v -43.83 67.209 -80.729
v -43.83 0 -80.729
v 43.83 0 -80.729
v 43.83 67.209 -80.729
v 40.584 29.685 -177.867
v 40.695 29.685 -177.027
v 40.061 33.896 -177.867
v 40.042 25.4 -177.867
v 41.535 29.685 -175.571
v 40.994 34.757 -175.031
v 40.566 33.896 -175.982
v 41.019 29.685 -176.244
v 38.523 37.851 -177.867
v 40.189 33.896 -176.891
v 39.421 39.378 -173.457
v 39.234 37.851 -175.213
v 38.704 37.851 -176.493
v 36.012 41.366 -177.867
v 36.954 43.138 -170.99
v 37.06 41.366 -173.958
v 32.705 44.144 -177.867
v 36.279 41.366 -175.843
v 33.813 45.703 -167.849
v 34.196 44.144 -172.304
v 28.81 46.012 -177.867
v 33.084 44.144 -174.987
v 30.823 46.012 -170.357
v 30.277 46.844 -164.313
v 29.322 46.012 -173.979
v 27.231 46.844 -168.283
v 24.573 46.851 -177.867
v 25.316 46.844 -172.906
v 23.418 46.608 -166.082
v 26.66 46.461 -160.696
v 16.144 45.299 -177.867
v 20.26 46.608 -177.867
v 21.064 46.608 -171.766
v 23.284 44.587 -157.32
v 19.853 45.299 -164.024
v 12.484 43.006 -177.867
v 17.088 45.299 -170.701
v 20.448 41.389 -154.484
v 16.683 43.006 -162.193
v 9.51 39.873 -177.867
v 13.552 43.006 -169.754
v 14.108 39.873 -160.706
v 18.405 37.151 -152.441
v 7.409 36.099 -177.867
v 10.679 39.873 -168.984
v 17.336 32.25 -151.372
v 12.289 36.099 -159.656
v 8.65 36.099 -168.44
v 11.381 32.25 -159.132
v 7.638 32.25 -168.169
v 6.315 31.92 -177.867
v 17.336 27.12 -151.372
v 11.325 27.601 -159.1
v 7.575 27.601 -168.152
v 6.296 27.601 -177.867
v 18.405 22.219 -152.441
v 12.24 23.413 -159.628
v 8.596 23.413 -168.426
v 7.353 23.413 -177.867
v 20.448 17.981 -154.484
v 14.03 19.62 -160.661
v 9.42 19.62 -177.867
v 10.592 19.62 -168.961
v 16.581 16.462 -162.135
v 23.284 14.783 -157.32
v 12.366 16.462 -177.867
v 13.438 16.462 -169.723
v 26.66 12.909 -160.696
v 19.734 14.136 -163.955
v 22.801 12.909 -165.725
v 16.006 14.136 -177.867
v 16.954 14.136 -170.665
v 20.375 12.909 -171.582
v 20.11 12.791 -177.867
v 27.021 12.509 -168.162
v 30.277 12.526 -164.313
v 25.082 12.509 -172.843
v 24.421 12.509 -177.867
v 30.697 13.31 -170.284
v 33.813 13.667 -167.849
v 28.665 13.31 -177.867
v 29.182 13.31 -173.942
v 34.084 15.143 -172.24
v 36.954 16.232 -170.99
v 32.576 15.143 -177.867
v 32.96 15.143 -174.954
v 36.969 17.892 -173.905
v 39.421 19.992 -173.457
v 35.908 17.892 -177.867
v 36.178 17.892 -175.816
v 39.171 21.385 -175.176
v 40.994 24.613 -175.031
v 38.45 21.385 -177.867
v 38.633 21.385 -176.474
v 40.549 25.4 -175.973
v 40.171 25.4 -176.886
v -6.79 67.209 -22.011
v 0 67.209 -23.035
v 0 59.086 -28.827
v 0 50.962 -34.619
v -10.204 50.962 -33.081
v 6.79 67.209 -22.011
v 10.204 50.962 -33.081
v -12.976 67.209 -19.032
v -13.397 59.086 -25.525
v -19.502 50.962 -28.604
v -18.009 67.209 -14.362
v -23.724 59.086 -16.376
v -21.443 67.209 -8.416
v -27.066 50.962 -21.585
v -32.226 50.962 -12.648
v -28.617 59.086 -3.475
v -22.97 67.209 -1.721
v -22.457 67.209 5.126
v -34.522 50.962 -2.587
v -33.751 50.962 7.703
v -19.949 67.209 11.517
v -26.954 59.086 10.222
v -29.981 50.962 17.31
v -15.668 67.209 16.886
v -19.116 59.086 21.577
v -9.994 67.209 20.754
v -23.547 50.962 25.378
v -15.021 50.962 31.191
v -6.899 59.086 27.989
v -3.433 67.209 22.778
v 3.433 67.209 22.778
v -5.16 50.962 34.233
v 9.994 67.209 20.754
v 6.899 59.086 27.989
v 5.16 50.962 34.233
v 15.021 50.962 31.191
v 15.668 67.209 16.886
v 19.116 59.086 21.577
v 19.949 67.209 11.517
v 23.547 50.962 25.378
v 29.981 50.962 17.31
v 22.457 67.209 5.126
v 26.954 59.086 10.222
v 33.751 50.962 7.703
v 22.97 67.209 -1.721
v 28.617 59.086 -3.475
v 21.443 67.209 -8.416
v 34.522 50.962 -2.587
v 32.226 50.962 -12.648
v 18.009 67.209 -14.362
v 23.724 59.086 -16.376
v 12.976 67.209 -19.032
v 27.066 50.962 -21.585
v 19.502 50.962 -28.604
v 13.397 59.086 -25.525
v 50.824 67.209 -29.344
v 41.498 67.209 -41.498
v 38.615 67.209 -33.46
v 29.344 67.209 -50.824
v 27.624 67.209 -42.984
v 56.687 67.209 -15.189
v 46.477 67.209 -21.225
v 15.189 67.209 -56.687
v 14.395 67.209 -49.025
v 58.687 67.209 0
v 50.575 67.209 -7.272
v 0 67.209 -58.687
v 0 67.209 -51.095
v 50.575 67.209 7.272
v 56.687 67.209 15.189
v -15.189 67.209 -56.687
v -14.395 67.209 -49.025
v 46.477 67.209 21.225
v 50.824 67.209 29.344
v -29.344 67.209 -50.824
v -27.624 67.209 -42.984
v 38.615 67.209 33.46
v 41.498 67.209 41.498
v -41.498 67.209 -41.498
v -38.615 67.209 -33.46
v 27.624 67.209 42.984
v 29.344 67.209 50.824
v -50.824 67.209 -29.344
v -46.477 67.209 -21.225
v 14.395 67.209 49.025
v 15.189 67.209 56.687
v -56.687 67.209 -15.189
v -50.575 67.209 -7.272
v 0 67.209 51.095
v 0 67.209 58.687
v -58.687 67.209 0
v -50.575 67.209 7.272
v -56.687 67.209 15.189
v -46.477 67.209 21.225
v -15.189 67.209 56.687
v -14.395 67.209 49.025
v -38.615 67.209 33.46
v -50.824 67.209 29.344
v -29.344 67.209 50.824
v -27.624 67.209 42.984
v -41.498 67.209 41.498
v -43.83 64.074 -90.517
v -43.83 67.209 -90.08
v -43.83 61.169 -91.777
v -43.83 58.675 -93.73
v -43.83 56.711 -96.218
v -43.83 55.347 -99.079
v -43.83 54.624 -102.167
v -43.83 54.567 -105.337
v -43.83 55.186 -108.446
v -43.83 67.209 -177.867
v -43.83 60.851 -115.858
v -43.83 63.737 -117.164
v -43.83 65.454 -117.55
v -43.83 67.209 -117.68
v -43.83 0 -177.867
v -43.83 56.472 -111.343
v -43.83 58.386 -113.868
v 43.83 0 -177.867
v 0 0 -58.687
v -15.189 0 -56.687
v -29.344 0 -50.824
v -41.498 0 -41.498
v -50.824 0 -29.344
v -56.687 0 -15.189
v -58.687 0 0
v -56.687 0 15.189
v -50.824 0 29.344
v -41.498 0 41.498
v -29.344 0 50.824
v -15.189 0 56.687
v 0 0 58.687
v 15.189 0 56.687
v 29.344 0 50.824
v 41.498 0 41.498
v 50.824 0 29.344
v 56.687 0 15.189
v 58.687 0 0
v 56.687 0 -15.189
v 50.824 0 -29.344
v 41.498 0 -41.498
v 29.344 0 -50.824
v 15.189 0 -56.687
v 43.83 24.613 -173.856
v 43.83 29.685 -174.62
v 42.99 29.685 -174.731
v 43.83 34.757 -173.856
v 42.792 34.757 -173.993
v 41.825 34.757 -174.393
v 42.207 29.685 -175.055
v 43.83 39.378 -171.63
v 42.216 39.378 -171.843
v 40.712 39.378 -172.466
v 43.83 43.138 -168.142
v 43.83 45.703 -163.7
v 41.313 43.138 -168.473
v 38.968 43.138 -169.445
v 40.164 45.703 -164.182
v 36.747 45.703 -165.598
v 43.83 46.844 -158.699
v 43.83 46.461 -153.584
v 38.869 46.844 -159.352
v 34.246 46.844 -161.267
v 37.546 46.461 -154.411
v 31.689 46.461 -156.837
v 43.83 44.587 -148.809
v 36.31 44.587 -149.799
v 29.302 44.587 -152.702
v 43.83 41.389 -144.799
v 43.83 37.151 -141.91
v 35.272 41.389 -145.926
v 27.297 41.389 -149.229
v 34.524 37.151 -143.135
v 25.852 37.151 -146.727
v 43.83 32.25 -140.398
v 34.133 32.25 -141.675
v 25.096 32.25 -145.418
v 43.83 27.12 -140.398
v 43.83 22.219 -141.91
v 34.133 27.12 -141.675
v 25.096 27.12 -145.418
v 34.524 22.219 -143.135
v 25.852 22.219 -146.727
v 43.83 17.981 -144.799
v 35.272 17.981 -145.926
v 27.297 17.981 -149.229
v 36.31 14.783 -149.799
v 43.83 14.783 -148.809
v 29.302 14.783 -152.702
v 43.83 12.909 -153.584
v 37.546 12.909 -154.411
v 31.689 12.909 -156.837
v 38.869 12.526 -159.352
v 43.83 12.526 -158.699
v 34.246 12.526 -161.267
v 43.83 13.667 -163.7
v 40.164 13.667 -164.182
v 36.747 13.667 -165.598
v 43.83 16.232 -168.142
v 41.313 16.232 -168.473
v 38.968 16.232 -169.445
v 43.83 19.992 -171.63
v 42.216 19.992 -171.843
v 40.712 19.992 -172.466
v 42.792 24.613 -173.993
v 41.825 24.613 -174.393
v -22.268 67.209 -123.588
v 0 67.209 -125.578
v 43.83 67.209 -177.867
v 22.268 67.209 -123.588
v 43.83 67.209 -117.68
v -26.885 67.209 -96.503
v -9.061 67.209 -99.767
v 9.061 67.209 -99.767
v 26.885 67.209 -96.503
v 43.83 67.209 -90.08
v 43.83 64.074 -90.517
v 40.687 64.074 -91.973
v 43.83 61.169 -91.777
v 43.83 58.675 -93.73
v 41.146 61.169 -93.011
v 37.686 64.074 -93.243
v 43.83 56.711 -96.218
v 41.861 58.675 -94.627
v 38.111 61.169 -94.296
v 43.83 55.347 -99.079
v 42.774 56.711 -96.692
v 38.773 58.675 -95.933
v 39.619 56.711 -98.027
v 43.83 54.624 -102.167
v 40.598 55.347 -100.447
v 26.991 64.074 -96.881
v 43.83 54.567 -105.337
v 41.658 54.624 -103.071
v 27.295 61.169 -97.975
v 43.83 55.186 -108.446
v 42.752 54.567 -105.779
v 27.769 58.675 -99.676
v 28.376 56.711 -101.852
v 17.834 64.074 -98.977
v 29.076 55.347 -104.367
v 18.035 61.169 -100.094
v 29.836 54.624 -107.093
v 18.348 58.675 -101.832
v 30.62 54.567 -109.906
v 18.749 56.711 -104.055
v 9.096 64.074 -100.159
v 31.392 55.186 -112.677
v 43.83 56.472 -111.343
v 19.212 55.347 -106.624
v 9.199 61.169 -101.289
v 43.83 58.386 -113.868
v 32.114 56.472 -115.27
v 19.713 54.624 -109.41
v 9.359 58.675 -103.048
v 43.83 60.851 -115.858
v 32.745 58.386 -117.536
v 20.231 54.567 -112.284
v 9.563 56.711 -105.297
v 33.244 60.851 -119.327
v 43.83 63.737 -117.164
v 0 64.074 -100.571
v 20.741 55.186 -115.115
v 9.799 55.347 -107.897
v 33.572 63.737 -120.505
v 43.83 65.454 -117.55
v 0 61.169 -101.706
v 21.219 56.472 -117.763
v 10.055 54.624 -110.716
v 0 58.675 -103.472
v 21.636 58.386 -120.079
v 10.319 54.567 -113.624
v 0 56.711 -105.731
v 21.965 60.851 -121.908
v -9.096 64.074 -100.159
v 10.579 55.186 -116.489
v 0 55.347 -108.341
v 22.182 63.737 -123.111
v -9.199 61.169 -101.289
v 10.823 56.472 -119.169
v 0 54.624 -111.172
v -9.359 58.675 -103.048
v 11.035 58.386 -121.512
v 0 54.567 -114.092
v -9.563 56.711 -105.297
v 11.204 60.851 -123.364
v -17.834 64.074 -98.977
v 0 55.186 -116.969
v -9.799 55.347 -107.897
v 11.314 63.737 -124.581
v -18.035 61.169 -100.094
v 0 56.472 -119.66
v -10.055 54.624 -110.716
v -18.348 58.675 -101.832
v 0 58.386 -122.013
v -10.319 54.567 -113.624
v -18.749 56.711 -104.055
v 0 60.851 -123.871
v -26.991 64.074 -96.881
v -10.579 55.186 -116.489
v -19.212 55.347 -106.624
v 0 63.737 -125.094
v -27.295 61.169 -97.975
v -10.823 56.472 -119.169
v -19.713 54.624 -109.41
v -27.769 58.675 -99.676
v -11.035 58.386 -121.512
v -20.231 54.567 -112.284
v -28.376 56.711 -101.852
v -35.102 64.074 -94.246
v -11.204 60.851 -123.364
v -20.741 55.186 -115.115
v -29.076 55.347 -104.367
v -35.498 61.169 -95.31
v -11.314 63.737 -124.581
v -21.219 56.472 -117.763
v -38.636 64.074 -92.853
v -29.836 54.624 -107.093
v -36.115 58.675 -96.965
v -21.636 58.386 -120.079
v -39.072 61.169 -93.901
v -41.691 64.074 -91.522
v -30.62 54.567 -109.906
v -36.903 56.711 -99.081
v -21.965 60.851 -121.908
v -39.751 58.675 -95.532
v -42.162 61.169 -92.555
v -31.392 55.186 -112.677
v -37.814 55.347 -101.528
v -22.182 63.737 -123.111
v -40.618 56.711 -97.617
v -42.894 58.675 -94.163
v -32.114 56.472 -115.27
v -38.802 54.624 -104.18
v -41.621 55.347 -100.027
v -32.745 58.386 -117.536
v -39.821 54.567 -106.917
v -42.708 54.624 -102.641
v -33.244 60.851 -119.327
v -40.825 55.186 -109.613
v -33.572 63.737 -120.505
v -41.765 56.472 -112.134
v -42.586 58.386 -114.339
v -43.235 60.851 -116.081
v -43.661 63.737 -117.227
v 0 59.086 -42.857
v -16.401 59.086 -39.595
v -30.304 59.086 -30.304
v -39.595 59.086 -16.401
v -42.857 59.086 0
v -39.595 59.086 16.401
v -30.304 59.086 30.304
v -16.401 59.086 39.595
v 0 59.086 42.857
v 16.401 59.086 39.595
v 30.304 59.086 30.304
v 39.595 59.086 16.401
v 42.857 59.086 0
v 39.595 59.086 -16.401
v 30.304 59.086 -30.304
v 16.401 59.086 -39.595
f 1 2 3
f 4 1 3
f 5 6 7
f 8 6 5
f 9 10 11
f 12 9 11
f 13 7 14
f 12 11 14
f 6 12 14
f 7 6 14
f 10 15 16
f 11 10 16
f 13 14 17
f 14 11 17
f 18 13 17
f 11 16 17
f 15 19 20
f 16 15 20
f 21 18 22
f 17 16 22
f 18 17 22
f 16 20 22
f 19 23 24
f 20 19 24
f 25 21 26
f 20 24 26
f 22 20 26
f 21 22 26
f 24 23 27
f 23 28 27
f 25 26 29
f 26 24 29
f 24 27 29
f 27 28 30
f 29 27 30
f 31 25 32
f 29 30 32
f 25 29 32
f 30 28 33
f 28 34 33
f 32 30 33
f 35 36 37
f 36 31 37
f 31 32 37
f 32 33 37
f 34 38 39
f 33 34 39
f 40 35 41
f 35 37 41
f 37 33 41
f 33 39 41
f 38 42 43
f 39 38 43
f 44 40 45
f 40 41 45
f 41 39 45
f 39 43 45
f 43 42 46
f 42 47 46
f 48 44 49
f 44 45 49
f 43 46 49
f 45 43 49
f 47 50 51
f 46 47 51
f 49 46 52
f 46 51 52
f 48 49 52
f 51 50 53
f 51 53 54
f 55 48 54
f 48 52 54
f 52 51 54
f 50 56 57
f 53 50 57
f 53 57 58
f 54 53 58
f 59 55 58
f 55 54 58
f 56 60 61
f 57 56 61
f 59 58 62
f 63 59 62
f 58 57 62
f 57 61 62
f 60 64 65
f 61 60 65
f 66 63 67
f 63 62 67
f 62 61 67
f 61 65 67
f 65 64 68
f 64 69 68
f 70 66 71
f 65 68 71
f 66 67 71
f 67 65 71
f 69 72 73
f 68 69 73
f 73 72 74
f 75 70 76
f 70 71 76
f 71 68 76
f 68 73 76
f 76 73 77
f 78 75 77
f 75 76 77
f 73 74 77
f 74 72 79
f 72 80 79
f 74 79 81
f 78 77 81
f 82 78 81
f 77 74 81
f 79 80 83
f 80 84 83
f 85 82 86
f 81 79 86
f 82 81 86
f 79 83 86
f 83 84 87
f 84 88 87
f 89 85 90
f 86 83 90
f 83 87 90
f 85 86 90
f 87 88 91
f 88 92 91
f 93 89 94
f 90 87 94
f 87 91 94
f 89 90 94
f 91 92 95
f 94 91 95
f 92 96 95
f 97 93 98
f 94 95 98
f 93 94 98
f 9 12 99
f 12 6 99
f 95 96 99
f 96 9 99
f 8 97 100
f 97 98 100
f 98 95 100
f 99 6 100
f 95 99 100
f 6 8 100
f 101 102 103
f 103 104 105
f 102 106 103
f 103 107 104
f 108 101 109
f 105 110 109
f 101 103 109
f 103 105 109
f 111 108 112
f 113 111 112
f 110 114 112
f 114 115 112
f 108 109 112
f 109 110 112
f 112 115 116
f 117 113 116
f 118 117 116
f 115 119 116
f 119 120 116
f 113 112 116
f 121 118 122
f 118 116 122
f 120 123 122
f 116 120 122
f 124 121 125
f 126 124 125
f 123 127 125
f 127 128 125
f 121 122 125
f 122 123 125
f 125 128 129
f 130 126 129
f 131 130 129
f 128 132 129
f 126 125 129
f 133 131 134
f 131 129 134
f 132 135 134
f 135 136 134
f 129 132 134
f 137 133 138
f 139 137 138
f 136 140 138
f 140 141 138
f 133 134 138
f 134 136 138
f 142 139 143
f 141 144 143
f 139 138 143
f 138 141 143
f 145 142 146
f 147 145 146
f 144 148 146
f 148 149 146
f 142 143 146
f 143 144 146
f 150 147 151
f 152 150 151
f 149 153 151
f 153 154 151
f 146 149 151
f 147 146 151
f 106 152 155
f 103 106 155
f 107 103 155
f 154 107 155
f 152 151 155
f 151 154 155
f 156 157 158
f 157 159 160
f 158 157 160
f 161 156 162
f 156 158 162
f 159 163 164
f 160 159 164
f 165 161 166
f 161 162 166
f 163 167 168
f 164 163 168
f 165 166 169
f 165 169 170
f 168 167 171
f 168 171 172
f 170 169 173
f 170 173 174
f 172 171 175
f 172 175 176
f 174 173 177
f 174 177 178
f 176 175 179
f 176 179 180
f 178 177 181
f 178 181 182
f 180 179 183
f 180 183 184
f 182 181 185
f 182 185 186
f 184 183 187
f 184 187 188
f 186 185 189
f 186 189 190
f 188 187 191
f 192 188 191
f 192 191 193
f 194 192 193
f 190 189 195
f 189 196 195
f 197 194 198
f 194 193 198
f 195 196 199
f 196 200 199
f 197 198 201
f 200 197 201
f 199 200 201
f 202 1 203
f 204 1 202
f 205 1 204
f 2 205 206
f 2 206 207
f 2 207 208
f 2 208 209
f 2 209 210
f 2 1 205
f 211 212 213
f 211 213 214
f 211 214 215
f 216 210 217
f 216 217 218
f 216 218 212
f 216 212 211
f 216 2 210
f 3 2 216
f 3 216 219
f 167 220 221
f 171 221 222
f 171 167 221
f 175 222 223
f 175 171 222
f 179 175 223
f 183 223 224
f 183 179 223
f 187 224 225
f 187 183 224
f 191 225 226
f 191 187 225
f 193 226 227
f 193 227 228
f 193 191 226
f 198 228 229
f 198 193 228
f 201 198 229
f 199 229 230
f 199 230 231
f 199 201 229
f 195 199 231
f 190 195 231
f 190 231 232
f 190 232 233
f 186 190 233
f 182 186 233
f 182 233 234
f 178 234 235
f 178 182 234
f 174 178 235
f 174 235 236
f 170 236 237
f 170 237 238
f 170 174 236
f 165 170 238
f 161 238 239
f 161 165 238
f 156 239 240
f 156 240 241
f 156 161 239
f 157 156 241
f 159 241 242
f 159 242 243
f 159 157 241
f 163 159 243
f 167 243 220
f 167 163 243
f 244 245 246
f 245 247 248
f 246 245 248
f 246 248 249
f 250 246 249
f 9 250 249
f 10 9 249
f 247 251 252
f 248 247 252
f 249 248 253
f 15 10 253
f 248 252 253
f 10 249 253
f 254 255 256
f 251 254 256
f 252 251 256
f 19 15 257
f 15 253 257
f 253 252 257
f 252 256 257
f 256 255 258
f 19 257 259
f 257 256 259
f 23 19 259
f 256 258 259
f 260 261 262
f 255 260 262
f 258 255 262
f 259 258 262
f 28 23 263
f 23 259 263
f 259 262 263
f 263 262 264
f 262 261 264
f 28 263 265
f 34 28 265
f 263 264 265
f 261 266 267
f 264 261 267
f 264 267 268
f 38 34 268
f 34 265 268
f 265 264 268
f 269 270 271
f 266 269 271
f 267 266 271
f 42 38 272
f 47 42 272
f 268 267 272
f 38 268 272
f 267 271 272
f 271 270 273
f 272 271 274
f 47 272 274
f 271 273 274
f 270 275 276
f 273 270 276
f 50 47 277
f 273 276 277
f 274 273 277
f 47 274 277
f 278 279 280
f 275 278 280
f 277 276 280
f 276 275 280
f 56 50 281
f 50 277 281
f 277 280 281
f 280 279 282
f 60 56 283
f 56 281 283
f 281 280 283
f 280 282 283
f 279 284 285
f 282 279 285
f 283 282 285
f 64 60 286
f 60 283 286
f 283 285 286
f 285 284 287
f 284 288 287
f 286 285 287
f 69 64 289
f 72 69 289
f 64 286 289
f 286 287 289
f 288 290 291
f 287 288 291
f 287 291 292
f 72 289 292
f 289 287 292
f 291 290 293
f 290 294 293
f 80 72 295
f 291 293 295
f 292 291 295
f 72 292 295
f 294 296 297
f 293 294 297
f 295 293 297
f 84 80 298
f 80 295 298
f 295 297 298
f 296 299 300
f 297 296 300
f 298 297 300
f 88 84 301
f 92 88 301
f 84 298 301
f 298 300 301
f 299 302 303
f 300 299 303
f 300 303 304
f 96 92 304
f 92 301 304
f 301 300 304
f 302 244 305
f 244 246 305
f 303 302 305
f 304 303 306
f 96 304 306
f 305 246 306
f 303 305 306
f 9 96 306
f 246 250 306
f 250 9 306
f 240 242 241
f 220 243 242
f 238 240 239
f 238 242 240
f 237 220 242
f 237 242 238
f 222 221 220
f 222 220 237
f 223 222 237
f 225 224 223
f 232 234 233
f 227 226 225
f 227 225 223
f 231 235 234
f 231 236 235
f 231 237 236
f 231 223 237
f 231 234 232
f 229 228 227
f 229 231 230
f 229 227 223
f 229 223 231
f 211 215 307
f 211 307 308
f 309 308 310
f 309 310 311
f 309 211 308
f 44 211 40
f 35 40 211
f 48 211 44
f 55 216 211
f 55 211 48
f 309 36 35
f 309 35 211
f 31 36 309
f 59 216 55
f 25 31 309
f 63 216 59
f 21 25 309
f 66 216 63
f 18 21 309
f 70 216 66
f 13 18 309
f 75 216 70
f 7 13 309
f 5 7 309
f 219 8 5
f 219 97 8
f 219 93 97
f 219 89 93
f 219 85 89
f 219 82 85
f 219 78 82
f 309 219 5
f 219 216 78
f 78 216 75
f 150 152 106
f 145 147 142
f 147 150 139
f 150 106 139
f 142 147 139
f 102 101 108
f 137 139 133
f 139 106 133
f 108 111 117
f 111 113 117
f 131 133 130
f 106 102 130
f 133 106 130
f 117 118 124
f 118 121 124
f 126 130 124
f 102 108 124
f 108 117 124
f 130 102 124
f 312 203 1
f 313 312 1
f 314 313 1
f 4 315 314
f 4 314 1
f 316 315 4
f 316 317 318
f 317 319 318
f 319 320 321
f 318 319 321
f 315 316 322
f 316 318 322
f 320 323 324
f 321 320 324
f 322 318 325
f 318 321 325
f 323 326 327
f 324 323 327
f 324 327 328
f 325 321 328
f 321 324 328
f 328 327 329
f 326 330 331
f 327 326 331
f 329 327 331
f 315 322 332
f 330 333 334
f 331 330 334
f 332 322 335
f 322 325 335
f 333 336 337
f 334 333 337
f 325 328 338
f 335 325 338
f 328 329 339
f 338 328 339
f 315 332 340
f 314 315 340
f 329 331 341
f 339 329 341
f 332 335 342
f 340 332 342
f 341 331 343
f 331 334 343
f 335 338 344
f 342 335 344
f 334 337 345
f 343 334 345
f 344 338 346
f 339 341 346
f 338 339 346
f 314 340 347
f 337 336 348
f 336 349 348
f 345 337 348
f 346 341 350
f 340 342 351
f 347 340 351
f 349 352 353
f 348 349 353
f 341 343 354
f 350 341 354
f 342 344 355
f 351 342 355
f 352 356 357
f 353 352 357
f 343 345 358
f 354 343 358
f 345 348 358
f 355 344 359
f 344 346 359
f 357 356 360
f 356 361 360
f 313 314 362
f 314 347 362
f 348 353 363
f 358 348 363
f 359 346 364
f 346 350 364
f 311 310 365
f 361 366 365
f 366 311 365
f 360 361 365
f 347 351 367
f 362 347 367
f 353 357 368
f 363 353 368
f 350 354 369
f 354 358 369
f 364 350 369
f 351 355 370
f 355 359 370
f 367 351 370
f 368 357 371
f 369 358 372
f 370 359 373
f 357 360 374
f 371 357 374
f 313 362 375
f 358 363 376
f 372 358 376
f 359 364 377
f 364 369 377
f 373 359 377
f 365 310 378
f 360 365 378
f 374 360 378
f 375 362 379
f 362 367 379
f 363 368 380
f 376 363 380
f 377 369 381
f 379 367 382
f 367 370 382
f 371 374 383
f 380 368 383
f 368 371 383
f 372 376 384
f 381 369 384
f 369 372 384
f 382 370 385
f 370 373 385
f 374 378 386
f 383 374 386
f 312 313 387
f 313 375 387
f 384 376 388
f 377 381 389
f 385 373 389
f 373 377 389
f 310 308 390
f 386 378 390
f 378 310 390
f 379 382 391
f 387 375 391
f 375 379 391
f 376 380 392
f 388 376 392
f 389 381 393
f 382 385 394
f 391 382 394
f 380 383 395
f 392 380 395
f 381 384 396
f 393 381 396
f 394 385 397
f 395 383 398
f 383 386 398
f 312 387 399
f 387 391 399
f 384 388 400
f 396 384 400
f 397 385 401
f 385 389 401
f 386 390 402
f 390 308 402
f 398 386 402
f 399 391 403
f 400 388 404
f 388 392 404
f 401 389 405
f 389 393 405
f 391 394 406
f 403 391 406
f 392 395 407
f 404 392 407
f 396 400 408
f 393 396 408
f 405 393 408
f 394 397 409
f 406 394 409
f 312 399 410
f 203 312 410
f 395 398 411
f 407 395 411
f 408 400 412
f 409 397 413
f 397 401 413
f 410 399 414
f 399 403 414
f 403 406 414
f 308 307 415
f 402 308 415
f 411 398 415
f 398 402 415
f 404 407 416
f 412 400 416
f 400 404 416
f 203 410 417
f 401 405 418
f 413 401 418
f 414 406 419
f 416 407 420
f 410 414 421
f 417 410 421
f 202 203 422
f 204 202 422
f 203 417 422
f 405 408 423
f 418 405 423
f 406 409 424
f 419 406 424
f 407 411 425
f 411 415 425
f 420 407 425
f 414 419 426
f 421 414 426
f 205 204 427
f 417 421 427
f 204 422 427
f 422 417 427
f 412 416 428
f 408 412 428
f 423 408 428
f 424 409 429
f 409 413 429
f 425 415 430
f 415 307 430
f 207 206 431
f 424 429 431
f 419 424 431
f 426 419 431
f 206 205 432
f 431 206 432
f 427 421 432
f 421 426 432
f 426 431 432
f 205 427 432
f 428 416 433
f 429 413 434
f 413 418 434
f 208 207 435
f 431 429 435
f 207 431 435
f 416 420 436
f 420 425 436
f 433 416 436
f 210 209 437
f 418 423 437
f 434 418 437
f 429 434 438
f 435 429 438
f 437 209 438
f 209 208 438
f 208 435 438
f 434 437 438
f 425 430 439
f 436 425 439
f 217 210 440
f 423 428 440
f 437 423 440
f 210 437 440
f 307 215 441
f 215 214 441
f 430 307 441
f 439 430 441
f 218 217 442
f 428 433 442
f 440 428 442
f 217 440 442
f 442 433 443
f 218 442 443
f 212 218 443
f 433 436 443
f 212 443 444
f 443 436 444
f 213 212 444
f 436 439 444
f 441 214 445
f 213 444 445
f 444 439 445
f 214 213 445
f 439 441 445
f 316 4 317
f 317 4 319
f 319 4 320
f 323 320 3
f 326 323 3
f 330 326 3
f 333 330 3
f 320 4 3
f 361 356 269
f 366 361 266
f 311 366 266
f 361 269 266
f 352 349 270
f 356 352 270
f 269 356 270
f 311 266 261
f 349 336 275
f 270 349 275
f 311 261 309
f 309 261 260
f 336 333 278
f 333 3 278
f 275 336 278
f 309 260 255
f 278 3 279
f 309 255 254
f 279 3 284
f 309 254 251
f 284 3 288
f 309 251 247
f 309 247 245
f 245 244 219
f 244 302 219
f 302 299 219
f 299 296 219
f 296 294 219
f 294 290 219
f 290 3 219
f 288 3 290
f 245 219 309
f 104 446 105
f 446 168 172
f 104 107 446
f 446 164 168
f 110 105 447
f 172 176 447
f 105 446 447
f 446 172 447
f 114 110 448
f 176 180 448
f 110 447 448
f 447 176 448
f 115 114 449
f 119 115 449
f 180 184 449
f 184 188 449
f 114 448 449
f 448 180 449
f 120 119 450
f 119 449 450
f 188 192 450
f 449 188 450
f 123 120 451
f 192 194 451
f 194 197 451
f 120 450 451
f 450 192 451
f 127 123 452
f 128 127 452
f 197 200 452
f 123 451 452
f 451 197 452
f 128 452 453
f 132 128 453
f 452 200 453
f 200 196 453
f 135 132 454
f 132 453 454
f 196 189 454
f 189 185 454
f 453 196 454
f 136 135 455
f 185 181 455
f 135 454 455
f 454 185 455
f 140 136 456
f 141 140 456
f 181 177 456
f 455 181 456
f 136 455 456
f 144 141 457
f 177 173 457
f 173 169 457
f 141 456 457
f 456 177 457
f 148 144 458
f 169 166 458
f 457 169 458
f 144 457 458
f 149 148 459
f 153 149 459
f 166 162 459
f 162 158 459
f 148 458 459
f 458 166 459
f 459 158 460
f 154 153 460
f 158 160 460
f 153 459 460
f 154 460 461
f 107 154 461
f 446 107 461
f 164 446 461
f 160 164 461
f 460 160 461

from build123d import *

# Parameters (mm, degrees)
SKETCH1_W           = 58.68704402
SKETCH1_H           = 67.209255033
SKETCH2_W           = 87.660679444
SKETCH2_H           = 97.137509655
BOSS_EXTRUDE1_DEPTH = 67.209255033
SKETCH3_R           = 12.7
SKETCH4_R           = 17.207386705


with BuildPart() as part:
    # Sketch1 → Revolve1 (revolve)
    with BuildSketch(Plane.XY, mode=Mode.PRIVATE) as revolve1_sk:
        with Locations((29.34352201, 33.604627517)):
            Rectangle(SKETCH1_W, SKETCH1_H)
    revolve(revolve1_sk.sketch.rotate(Axis((0, 0, 0), (0, 1, 0)), 90), axis=Axis((0, 0, 0), (0, 1, 0)))


with BuildPart() as body_2:
    # Sketch2 → Boss-Extrude1 (new body)
    with BuildSketch(Plane(origin=(0, 0, 0), x_dir=(1, 0, 0), z_dir=(0, 1, 0))):
        with Locations((0, 129.298002943)):
            Rectangle(SKETCH2_W, SKETCH2_H)
    extrude(amount=BOSS_EXTRUDE1_DEPTH)


with BuildPart() as cut_revolve1_tool:
    # Sketch3 → Cut-Revolve1 (revolve)
    with BuildSketch(Plane(origin=(0, 0, 0), x_dir=(0, 0, -1), z_dir=(1, 0, 0))):
        with Locations((112.877766248, 67.209255033)):
            Circle(SKETCH3_R)
        Polygon((23.034865904, 67.209255033), (34.619194029, 50.962115843), (51.094682917, 67.209255033), align=None)
    revolve(axis=Axis((0, 0, 0), (0, 1, 0)))


with BuildPart() as part_1:
    add(part.part)

    # Cut-Revolve1: cut by cut_revolve1_tool
    add(cut_revolve1_tool.part, mode=Mode.SUBTRACT)


with BuildPart() as body_2_1:
    add(body_2.part)

    # Cut-Revolve1: cut by cut_revolve1_tool
    add(cut_revolve1_tool.part, mode=Mode.SUBTRACT)

    # Sketch4 → Cut-Revolve2 (revolve, cut)
    with BuildSketch(Plane(origin=(43.830339722, 0, 0), x_dir=(0, 0, -1), z_dir=(1, 0, 0)), mode=Mode.PRIVATE) as cut_revolve2_sk:
        with Locations((157.413072149, 29.685041268)):
            Circle(SKETCH4_R)
    revolve(cut_revolve2_sk.sketch.rotate(Axis((43.830339722, 198.053018745, -177.86675777), (0, -1, 0)), 45), axis=Axis((43.830339722, 198.053018745, -177.86675777), (0, -1, 0)), mode=Mode.SUBTRACT)


solid = Compound([part_1.part, body_2_1.part])
